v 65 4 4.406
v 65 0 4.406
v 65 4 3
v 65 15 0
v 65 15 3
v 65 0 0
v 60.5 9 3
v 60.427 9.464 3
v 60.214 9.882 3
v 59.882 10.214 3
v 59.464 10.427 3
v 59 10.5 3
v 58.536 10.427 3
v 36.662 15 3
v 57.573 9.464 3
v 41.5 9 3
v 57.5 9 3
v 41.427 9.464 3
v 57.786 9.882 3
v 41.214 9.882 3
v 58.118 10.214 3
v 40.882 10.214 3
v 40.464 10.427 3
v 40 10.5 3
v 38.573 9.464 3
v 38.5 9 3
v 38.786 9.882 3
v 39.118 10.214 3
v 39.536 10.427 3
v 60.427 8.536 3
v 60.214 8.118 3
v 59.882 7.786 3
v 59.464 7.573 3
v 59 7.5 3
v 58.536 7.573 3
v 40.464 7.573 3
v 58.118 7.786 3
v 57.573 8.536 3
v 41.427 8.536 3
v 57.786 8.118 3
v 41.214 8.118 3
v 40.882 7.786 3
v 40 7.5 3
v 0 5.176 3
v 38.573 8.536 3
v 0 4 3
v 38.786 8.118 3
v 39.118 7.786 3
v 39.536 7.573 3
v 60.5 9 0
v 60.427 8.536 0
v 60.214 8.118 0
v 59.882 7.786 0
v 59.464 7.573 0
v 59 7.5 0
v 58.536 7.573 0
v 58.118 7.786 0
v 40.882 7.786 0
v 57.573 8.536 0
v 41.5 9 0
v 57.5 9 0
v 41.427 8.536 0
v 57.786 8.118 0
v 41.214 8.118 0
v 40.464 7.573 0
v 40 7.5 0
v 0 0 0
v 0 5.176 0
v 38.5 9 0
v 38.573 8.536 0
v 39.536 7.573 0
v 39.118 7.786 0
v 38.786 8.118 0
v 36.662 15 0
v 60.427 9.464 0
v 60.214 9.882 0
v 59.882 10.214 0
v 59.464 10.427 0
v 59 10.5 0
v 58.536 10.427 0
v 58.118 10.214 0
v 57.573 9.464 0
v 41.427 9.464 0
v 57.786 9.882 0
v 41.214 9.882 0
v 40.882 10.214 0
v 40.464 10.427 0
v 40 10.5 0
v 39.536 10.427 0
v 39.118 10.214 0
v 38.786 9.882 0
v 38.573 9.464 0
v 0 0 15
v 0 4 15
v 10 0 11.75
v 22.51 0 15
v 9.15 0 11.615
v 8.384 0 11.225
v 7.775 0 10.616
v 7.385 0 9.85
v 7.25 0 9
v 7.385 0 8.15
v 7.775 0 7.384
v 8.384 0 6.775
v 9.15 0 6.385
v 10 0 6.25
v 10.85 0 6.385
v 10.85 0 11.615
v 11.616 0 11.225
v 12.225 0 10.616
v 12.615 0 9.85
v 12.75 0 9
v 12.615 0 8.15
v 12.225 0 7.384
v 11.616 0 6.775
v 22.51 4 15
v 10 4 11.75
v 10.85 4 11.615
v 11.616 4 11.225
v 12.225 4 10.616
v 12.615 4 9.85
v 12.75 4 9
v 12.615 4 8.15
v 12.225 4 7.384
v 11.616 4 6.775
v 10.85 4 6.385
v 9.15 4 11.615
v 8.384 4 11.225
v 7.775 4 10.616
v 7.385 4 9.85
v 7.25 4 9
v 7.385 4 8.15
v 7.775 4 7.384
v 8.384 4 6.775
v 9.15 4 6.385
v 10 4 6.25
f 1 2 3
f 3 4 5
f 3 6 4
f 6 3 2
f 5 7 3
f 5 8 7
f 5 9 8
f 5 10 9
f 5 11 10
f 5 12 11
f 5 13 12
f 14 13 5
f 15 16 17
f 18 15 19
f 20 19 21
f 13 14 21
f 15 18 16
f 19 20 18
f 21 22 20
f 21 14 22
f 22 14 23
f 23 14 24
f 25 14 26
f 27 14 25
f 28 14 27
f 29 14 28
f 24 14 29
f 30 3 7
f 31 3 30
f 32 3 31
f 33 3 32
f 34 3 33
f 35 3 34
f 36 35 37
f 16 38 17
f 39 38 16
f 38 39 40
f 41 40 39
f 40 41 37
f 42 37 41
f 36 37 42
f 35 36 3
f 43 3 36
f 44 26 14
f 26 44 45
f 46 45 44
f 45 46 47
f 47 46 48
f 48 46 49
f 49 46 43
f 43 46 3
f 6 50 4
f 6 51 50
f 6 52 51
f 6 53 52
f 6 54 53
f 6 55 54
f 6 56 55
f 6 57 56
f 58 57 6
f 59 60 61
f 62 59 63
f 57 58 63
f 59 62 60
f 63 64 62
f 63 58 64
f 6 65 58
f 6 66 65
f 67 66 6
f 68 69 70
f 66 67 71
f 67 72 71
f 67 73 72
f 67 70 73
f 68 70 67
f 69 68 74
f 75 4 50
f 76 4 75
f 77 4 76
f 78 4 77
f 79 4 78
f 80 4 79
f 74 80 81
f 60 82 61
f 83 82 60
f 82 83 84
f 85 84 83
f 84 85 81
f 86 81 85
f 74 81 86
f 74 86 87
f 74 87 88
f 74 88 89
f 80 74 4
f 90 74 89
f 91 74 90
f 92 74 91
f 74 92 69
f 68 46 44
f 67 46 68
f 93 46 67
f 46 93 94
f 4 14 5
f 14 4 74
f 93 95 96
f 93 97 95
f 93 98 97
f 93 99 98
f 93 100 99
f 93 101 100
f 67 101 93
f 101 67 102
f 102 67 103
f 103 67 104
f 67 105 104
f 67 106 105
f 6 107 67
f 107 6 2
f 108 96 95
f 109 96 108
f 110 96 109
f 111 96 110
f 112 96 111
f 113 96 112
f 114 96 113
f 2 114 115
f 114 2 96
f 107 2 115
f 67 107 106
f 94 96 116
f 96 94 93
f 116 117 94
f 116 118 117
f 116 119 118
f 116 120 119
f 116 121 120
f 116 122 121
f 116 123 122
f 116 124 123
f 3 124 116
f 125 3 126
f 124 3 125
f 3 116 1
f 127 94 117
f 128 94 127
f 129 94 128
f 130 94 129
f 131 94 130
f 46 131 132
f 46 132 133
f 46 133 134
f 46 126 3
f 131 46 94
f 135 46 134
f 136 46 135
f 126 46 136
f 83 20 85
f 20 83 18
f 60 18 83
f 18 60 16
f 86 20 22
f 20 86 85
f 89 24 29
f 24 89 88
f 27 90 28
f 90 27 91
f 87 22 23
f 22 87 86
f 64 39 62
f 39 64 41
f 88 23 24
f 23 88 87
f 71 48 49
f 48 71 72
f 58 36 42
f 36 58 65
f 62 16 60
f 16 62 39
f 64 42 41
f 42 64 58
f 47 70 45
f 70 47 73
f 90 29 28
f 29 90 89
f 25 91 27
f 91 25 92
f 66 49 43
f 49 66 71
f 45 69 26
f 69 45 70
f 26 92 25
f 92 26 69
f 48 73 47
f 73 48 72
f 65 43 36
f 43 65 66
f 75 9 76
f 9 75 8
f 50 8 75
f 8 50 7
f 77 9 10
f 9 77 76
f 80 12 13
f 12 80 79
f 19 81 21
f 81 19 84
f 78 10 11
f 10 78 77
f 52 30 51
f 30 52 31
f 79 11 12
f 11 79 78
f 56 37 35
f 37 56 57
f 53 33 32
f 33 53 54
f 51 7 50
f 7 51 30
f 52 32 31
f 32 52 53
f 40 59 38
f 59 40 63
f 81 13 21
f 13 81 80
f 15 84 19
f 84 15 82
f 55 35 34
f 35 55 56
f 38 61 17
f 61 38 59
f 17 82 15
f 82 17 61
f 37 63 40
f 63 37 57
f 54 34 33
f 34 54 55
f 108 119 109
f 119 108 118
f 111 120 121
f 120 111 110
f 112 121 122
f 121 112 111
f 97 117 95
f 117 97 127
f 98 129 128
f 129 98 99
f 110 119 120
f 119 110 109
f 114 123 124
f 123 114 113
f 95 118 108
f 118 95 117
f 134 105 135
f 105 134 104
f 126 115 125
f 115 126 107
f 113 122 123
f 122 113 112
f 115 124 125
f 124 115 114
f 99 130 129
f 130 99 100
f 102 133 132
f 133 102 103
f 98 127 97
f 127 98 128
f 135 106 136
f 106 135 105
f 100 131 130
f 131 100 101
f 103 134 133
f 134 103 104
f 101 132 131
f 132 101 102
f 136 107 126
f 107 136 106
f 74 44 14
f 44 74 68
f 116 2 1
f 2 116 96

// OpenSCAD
difference(){
    union(){  
        cube([65,15,3]);
        cube([65,4,15]);
    }
    translate([55-15,9,0]){
        cylinder(3.3, d=3, $fn=20);
    }
    translate([55+19-15,9,0]){
        cylinder(3.3, d=3, $fn=20);
    }
    rotate([90,0,0]){
        translate([10,9,-4]){
            cylinder(5, d=5.5, $fn=20);
        }
    }
    rotate([0,0,15]){
        translate([0,5,0]){
            cube([100,19.5,3]);
        }
    }
    rotate([0,14,0]){
        translate([17,0,20]){
            cube([100,4,20]);
        }
    }
}
